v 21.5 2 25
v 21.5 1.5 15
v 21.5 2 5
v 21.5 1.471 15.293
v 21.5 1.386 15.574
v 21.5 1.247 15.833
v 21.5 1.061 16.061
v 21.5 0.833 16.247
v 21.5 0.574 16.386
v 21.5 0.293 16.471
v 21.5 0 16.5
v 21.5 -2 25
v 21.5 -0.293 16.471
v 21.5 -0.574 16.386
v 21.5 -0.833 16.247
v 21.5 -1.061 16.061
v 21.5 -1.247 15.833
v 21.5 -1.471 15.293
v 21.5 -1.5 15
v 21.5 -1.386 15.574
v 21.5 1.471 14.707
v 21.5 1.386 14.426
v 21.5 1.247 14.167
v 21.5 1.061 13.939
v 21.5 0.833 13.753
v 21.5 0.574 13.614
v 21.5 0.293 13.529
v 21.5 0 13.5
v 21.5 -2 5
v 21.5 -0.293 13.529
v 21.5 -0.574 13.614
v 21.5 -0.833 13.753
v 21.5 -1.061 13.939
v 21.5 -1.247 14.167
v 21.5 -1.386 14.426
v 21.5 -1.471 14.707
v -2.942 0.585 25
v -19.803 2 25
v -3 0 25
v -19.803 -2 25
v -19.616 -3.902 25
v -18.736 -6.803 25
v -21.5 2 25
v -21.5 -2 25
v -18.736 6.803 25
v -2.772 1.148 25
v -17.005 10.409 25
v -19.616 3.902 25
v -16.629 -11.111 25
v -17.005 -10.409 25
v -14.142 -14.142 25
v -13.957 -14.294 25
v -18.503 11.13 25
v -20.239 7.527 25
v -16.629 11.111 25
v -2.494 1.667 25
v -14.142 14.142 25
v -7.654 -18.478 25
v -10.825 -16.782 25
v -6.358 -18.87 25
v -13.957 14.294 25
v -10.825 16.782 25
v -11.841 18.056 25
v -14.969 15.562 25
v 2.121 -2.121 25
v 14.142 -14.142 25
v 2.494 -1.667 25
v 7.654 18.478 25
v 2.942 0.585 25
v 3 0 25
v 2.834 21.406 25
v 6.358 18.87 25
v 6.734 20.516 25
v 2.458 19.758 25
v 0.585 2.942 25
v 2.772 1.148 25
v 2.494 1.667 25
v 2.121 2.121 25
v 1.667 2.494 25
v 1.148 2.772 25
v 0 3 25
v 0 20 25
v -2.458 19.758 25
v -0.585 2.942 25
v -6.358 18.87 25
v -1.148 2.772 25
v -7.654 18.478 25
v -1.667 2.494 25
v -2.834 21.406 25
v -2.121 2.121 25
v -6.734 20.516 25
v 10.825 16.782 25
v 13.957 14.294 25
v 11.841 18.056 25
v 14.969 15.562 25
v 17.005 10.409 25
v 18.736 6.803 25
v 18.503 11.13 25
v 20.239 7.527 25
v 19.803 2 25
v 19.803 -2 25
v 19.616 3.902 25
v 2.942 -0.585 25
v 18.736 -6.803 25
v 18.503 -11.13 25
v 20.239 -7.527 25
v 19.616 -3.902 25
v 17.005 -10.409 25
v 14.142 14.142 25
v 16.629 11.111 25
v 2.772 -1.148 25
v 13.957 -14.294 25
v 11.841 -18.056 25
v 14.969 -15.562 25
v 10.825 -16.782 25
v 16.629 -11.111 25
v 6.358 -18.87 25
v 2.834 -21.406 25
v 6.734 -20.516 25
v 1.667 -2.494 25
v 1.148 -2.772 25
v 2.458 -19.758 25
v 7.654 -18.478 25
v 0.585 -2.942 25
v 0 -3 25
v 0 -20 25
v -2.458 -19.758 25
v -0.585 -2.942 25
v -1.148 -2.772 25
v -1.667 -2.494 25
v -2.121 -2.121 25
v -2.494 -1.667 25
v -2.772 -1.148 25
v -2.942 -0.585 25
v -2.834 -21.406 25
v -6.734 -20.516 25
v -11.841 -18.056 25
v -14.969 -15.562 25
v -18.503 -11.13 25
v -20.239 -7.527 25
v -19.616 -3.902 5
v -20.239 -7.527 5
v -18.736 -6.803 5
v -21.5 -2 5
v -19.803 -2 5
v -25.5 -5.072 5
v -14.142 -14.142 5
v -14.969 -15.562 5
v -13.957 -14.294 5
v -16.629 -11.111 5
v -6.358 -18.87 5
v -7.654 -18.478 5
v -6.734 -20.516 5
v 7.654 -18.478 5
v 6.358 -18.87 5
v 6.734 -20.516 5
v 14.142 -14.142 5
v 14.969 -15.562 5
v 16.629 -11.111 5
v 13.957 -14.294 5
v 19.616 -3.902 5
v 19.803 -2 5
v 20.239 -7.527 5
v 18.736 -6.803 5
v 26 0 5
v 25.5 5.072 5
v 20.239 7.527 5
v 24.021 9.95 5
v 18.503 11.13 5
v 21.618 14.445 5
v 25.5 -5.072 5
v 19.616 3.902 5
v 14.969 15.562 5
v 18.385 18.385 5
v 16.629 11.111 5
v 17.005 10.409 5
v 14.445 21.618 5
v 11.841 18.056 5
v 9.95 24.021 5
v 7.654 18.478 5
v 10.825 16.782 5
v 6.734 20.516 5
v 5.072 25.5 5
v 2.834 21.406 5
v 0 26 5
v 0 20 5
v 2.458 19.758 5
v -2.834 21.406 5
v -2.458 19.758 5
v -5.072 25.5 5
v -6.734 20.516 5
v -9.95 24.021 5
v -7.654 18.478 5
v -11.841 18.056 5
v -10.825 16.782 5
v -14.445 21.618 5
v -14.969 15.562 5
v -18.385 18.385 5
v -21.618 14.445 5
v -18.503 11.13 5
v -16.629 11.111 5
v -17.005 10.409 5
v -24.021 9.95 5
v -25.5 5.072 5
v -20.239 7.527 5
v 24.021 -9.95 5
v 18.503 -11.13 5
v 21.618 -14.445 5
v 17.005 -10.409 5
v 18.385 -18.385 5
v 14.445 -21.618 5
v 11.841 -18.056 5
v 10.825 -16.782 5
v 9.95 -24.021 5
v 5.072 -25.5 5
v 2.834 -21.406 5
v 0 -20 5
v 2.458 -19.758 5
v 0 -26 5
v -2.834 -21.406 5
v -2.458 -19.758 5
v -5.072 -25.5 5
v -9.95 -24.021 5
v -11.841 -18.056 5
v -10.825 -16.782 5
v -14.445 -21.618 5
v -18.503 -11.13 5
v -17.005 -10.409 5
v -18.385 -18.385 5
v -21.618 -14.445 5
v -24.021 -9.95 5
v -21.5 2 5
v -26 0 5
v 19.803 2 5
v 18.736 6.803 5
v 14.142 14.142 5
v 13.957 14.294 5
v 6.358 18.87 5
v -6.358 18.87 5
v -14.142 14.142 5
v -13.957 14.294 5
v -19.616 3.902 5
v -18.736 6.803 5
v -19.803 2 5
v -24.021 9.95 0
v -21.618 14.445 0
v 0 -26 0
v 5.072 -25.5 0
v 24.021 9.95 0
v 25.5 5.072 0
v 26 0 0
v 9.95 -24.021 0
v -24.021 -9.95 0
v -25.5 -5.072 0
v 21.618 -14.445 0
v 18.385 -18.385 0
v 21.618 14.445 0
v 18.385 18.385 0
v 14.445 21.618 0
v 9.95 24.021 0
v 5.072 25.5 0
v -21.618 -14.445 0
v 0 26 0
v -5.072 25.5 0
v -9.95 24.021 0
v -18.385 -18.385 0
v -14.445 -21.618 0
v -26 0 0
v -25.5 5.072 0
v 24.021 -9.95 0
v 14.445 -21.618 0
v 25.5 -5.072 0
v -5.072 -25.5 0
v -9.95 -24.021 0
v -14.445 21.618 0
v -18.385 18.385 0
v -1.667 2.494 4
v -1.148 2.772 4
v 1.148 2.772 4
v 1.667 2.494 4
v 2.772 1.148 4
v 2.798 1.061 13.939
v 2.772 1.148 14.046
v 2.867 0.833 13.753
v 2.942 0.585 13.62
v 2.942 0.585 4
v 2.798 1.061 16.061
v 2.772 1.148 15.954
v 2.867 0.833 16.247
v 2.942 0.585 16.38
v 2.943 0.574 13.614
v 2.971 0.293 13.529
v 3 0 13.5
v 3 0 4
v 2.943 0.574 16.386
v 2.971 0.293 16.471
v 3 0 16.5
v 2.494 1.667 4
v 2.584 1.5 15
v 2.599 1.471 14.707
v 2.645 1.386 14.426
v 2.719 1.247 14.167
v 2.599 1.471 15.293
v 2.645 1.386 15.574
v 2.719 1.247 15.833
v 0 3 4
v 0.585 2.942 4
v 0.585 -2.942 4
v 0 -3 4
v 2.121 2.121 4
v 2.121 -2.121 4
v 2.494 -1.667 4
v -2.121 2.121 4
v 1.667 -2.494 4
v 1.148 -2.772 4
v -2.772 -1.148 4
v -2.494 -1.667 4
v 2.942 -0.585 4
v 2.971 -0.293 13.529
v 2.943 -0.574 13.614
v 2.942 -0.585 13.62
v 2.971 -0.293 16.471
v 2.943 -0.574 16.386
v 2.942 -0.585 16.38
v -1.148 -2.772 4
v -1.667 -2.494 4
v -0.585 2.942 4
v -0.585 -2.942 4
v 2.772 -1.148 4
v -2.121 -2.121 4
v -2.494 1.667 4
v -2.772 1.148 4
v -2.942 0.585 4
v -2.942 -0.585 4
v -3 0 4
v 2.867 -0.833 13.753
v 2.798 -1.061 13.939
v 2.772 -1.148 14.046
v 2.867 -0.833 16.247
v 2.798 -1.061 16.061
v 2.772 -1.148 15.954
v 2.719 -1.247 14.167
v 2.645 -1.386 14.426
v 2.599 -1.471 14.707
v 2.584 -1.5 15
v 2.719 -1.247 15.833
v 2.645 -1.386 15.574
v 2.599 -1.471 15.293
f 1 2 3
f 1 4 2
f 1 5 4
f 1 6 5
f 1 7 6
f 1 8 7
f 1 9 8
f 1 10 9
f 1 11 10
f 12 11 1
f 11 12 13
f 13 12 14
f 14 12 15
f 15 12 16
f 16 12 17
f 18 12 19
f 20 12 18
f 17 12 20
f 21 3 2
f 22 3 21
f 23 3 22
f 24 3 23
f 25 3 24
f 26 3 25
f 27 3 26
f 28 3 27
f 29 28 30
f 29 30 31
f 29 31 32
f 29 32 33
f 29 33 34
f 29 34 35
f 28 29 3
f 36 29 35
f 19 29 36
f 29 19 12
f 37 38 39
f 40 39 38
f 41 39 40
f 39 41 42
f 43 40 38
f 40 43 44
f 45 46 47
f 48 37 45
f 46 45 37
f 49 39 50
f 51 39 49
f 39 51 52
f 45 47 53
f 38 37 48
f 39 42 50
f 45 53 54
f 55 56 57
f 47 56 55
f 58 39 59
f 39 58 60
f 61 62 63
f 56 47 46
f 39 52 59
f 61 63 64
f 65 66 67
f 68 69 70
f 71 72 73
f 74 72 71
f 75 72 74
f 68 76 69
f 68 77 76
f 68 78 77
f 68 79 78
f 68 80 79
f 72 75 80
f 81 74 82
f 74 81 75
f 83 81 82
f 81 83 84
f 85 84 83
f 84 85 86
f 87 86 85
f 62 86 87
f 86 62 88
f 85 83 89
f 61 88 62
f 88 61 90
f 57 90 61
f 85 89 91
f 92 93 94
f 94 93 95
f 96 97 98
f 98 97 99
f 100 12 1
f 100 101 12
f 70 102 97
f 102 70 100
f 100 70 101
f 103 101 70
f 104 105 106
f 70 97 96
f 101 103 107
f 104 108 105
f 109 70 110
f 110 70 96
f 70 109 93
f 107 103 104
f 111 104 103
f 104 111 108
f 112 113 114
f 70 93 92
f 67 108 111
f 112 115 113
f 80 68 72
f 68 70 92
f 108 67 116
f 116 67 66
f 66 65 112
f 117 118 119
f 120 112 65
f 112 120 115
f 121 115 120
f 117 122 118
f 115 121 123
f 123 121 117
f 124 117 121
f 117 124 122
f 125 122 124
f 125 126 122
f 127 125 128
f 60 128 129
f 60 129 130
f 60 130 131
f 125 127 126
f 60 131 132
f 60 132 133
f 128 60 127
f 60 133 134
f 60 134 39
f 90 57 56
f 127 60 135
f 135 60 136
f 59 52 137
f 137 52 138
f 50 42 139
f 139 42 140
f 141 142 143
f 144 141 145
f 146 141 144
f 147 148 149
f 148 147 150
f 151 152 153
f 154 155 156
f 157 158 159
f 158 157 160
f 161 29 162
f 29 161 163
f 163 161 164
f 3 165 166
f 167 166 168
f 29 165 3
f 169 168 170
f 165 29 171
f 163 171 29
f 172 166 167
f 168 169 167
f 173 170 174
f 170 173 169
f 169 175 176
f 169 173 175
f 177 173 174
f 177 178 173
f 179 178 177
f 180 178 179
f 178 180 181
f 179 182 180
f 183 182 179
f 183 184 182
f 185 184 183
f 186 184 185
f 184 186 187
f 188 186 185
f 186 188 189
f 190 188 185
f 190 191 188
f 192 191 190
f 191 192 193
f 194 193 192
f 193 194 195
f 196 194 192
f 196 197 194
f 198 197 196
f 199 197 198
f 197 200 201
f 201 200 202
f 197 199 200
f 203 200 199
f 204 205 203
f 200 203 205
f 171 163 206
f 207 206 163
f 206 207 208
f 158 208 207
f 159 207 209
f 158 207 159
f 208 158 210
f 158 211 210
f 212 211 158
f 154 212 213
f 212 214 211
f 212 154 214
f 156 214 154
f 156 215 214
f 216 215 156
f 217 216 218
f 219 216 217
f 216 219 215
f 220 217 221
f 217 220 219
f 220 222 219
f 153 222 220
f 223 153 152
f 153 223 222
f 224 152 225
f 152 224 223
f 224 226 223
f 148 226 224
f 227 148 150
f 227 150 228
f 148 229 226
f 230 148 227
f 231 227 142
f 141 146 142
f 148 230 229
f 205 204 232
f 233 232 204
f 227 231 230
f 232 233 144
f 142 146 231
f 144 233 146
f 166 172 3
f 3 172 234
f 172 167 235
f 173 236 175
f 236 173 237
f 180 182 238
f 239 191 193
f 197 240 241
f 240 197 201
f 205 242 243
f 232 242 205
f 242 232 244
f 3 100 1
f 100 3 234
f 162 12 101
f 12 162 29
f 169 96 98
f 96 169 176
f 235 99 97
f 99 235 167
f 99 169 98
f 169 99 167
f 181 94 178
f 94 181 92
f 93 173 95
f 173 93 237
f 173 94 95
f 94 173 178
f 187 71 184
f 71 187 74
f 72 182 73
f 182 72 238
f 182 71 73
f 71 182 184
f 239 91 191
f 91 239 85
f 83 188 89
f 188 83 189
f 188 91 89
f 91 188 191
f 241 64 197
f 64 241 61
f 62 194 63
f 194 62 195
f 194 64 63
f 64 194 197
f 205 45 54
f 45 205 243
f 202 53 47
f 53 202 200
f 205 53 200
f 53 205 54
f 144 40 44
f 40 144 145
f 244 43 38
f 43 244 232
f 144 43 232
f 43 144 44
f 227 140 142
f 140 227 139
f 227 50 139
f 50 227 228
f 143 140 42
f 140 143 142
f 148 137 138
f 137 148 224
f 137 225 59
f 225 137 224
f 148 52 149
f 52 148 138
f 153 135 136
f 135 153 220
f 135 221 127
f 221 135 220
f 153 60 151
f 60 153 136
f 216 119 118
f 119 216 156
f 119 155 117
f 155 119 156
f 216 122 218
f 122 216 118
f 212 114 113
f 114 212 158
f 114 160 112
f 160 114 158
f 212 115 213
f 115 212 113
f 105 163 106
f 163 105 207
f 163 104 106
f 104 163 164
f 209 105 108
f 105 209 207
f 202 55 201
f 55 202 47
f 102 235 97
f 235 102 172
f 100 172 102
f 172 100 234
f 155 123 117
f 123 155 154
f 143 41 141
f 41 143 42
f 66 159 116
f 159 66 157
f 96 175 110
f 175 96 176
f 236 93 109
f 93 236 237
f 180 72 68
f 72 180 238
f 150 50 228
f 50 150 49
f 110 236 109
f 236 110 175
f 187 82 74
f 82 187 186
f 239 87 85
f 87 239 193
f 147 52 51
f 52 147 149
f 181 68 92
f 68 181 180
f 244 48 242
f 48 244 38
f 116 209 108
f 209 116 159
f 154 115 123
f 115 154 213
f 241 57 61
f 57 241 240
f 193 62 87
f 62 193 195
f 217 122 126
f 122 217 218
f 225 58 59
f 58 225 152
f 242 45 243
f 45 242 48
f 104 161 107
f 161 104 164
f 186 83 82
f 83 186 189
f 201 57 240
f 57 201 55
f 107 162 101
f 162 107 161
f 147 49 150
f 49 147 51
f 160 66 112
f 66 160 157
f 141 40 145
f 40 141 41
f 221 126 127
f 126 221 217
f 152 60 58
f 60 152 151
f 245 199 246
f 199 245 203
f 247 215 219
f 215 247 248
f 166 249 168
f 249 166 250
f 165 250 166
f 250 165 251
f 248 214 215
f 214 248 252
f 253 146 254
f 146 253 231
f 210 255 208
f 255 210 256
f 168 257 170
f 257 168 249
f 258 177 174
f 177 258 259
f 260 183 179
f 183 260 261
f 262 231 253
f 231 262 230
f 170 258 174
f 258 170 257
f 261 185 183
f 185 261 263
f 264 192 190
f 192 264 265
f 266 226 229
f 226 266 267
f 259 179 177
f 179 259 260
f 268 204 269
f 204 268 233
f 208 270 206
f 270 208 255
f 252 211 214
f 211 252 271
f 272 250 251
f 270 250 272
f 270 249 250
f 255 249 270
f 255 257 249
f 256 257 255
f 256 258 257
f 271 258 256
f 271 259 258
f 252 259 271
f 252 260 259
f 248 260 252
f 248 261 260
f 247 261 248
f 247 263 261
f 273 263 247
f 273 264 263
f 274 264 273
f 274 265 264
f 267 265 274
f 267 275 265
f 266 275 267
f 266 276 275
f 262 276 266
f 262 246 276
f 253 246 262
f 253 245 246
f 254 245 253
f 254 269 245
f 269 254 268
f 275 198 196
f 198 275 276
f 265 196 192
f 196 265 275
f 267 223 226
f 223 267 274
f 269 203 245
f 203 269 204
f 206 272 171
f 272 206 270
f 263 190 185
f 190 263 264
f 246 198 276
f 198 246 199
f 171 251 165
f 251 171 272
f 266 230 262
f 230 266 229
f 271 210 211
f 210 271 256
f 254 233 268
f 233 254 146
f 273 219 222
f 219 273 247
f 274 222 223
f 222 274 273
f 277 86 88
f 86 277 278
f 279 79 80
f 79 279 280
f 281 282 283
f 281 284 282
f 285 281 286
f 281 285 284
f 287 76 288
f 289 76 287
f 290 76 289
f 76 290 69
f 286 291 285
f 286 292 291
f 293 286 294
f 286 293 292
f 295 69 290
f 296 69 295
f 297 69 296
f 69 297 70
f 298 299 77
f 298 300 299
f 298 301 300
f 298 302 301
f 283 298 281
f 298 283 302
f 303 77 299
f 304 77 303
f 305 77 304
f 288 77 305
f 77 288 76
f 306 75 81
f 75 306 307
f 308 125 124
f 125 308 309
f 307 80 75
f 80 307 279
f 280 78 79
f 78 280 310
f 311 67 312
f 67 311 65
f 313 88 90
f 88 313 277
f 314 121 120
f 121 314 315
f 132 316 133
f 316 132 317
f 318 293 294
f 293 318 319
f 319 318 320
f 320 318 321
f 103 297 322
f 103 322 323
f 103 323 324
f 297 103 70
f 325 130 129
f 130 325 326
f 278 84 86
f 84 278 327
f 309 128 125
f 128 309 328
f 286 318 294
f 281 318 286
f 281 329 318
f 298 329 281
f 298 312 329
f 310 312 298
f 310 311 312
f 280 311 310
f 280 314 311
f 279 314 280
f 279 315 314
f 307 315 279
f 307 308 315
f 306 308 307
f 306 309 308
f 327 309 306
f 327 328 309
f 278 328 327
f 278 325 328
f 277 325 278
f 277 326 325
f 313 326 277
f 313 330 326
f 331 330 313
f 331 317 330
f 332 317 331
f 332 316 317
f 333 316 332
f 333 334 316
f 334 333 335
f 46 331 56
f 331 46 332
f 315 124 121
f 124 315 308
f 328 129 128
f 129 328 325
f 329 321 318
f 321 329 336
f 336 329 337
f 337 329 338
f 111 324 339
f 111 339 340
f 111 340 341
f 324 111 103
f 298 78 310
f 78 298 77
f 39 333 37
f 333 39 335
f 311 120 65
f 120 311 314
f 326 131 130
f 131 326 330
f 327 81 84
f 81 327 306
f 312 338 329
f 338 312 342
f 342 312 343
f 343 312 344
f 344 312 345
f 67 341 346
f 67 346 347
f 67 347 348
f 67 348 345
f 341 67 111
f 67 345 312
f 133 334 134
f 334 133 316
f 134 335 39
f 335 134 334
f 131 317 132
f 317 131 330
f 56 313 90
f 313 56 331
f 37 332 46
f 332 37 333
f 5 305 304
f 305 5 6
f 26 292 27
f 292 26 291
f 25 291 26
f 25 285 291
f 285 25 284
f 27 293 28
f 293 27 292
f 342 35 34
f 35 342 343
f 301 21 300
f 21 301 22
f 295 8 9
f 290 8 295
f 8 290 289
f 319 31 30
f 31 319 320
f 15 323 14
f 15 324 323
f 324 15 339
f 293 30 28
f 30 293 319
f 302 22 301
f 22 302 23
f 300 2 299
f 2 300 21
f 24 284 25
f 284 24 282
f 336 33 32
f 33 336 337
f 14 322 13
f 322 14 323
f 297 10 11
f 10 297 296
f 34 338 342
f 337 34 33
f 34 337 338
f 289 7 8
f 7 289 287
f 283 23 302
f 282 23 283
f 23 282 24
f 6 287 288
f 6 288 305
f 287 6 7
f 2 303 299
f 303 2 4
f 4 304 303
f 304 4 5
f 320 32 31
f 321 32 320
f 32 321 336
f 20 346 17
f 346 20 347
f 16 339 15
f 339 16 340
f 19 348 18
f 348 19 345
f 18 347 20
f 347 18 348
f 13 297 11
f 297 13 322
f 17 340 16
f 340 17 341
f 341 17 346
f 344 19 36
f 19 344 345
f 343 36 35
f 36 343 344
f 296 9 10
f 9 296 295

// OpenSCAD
$fn = 32;

// ----------------------------------------------------------------------
// Control knob: skirt knob with grip ribs
// ----------------------------------------------------------------------

// --- parameters (mm) ---
skirt_d = 52;             // skirt diameter
skirt_t = 5;              // skirt thickness
rib_w = 4;                // grip rib width
rib_out = 2.5;            // grip rib radial protrusion
n_ribs = 14;              // number of grip ribs
knob_d = 40;              // knob body diameter
knob_h = 20;              // knob body height
bore_d = 6;               // shaft bore diameter
set_d = 3;                // set screw bore diameter

rib_step = 360 / n_ribs;  // rib angular step
total_h = skirt_t + knob_h;  // overall height

difference() {
  union() {
    translate([0, 0, skirt_t]) cylinder(h = knob_h, d = knob_d);
    cylinder(h = skirt_t, d = skirt_d);
    for (i = [0 : n_ribs - 1])
      rotate([0, 0, i * rib_step])
        translate([knob_d / 2 - 1, -rib_w / 2, skirt_t])
          cube([rib_out, rib_w, knob_h]);
  }
  translate([0, 0, skirt_t - 1]) cylinder(h = knob_h + 2, d = bore_d);
  translate([-1, 0, skirt_t + knob_h / 2]) rotate([0, 90, 0])
    cylinder(h = knob_d / 2 + bore_d / 2 + 2, d = set_d);
}
